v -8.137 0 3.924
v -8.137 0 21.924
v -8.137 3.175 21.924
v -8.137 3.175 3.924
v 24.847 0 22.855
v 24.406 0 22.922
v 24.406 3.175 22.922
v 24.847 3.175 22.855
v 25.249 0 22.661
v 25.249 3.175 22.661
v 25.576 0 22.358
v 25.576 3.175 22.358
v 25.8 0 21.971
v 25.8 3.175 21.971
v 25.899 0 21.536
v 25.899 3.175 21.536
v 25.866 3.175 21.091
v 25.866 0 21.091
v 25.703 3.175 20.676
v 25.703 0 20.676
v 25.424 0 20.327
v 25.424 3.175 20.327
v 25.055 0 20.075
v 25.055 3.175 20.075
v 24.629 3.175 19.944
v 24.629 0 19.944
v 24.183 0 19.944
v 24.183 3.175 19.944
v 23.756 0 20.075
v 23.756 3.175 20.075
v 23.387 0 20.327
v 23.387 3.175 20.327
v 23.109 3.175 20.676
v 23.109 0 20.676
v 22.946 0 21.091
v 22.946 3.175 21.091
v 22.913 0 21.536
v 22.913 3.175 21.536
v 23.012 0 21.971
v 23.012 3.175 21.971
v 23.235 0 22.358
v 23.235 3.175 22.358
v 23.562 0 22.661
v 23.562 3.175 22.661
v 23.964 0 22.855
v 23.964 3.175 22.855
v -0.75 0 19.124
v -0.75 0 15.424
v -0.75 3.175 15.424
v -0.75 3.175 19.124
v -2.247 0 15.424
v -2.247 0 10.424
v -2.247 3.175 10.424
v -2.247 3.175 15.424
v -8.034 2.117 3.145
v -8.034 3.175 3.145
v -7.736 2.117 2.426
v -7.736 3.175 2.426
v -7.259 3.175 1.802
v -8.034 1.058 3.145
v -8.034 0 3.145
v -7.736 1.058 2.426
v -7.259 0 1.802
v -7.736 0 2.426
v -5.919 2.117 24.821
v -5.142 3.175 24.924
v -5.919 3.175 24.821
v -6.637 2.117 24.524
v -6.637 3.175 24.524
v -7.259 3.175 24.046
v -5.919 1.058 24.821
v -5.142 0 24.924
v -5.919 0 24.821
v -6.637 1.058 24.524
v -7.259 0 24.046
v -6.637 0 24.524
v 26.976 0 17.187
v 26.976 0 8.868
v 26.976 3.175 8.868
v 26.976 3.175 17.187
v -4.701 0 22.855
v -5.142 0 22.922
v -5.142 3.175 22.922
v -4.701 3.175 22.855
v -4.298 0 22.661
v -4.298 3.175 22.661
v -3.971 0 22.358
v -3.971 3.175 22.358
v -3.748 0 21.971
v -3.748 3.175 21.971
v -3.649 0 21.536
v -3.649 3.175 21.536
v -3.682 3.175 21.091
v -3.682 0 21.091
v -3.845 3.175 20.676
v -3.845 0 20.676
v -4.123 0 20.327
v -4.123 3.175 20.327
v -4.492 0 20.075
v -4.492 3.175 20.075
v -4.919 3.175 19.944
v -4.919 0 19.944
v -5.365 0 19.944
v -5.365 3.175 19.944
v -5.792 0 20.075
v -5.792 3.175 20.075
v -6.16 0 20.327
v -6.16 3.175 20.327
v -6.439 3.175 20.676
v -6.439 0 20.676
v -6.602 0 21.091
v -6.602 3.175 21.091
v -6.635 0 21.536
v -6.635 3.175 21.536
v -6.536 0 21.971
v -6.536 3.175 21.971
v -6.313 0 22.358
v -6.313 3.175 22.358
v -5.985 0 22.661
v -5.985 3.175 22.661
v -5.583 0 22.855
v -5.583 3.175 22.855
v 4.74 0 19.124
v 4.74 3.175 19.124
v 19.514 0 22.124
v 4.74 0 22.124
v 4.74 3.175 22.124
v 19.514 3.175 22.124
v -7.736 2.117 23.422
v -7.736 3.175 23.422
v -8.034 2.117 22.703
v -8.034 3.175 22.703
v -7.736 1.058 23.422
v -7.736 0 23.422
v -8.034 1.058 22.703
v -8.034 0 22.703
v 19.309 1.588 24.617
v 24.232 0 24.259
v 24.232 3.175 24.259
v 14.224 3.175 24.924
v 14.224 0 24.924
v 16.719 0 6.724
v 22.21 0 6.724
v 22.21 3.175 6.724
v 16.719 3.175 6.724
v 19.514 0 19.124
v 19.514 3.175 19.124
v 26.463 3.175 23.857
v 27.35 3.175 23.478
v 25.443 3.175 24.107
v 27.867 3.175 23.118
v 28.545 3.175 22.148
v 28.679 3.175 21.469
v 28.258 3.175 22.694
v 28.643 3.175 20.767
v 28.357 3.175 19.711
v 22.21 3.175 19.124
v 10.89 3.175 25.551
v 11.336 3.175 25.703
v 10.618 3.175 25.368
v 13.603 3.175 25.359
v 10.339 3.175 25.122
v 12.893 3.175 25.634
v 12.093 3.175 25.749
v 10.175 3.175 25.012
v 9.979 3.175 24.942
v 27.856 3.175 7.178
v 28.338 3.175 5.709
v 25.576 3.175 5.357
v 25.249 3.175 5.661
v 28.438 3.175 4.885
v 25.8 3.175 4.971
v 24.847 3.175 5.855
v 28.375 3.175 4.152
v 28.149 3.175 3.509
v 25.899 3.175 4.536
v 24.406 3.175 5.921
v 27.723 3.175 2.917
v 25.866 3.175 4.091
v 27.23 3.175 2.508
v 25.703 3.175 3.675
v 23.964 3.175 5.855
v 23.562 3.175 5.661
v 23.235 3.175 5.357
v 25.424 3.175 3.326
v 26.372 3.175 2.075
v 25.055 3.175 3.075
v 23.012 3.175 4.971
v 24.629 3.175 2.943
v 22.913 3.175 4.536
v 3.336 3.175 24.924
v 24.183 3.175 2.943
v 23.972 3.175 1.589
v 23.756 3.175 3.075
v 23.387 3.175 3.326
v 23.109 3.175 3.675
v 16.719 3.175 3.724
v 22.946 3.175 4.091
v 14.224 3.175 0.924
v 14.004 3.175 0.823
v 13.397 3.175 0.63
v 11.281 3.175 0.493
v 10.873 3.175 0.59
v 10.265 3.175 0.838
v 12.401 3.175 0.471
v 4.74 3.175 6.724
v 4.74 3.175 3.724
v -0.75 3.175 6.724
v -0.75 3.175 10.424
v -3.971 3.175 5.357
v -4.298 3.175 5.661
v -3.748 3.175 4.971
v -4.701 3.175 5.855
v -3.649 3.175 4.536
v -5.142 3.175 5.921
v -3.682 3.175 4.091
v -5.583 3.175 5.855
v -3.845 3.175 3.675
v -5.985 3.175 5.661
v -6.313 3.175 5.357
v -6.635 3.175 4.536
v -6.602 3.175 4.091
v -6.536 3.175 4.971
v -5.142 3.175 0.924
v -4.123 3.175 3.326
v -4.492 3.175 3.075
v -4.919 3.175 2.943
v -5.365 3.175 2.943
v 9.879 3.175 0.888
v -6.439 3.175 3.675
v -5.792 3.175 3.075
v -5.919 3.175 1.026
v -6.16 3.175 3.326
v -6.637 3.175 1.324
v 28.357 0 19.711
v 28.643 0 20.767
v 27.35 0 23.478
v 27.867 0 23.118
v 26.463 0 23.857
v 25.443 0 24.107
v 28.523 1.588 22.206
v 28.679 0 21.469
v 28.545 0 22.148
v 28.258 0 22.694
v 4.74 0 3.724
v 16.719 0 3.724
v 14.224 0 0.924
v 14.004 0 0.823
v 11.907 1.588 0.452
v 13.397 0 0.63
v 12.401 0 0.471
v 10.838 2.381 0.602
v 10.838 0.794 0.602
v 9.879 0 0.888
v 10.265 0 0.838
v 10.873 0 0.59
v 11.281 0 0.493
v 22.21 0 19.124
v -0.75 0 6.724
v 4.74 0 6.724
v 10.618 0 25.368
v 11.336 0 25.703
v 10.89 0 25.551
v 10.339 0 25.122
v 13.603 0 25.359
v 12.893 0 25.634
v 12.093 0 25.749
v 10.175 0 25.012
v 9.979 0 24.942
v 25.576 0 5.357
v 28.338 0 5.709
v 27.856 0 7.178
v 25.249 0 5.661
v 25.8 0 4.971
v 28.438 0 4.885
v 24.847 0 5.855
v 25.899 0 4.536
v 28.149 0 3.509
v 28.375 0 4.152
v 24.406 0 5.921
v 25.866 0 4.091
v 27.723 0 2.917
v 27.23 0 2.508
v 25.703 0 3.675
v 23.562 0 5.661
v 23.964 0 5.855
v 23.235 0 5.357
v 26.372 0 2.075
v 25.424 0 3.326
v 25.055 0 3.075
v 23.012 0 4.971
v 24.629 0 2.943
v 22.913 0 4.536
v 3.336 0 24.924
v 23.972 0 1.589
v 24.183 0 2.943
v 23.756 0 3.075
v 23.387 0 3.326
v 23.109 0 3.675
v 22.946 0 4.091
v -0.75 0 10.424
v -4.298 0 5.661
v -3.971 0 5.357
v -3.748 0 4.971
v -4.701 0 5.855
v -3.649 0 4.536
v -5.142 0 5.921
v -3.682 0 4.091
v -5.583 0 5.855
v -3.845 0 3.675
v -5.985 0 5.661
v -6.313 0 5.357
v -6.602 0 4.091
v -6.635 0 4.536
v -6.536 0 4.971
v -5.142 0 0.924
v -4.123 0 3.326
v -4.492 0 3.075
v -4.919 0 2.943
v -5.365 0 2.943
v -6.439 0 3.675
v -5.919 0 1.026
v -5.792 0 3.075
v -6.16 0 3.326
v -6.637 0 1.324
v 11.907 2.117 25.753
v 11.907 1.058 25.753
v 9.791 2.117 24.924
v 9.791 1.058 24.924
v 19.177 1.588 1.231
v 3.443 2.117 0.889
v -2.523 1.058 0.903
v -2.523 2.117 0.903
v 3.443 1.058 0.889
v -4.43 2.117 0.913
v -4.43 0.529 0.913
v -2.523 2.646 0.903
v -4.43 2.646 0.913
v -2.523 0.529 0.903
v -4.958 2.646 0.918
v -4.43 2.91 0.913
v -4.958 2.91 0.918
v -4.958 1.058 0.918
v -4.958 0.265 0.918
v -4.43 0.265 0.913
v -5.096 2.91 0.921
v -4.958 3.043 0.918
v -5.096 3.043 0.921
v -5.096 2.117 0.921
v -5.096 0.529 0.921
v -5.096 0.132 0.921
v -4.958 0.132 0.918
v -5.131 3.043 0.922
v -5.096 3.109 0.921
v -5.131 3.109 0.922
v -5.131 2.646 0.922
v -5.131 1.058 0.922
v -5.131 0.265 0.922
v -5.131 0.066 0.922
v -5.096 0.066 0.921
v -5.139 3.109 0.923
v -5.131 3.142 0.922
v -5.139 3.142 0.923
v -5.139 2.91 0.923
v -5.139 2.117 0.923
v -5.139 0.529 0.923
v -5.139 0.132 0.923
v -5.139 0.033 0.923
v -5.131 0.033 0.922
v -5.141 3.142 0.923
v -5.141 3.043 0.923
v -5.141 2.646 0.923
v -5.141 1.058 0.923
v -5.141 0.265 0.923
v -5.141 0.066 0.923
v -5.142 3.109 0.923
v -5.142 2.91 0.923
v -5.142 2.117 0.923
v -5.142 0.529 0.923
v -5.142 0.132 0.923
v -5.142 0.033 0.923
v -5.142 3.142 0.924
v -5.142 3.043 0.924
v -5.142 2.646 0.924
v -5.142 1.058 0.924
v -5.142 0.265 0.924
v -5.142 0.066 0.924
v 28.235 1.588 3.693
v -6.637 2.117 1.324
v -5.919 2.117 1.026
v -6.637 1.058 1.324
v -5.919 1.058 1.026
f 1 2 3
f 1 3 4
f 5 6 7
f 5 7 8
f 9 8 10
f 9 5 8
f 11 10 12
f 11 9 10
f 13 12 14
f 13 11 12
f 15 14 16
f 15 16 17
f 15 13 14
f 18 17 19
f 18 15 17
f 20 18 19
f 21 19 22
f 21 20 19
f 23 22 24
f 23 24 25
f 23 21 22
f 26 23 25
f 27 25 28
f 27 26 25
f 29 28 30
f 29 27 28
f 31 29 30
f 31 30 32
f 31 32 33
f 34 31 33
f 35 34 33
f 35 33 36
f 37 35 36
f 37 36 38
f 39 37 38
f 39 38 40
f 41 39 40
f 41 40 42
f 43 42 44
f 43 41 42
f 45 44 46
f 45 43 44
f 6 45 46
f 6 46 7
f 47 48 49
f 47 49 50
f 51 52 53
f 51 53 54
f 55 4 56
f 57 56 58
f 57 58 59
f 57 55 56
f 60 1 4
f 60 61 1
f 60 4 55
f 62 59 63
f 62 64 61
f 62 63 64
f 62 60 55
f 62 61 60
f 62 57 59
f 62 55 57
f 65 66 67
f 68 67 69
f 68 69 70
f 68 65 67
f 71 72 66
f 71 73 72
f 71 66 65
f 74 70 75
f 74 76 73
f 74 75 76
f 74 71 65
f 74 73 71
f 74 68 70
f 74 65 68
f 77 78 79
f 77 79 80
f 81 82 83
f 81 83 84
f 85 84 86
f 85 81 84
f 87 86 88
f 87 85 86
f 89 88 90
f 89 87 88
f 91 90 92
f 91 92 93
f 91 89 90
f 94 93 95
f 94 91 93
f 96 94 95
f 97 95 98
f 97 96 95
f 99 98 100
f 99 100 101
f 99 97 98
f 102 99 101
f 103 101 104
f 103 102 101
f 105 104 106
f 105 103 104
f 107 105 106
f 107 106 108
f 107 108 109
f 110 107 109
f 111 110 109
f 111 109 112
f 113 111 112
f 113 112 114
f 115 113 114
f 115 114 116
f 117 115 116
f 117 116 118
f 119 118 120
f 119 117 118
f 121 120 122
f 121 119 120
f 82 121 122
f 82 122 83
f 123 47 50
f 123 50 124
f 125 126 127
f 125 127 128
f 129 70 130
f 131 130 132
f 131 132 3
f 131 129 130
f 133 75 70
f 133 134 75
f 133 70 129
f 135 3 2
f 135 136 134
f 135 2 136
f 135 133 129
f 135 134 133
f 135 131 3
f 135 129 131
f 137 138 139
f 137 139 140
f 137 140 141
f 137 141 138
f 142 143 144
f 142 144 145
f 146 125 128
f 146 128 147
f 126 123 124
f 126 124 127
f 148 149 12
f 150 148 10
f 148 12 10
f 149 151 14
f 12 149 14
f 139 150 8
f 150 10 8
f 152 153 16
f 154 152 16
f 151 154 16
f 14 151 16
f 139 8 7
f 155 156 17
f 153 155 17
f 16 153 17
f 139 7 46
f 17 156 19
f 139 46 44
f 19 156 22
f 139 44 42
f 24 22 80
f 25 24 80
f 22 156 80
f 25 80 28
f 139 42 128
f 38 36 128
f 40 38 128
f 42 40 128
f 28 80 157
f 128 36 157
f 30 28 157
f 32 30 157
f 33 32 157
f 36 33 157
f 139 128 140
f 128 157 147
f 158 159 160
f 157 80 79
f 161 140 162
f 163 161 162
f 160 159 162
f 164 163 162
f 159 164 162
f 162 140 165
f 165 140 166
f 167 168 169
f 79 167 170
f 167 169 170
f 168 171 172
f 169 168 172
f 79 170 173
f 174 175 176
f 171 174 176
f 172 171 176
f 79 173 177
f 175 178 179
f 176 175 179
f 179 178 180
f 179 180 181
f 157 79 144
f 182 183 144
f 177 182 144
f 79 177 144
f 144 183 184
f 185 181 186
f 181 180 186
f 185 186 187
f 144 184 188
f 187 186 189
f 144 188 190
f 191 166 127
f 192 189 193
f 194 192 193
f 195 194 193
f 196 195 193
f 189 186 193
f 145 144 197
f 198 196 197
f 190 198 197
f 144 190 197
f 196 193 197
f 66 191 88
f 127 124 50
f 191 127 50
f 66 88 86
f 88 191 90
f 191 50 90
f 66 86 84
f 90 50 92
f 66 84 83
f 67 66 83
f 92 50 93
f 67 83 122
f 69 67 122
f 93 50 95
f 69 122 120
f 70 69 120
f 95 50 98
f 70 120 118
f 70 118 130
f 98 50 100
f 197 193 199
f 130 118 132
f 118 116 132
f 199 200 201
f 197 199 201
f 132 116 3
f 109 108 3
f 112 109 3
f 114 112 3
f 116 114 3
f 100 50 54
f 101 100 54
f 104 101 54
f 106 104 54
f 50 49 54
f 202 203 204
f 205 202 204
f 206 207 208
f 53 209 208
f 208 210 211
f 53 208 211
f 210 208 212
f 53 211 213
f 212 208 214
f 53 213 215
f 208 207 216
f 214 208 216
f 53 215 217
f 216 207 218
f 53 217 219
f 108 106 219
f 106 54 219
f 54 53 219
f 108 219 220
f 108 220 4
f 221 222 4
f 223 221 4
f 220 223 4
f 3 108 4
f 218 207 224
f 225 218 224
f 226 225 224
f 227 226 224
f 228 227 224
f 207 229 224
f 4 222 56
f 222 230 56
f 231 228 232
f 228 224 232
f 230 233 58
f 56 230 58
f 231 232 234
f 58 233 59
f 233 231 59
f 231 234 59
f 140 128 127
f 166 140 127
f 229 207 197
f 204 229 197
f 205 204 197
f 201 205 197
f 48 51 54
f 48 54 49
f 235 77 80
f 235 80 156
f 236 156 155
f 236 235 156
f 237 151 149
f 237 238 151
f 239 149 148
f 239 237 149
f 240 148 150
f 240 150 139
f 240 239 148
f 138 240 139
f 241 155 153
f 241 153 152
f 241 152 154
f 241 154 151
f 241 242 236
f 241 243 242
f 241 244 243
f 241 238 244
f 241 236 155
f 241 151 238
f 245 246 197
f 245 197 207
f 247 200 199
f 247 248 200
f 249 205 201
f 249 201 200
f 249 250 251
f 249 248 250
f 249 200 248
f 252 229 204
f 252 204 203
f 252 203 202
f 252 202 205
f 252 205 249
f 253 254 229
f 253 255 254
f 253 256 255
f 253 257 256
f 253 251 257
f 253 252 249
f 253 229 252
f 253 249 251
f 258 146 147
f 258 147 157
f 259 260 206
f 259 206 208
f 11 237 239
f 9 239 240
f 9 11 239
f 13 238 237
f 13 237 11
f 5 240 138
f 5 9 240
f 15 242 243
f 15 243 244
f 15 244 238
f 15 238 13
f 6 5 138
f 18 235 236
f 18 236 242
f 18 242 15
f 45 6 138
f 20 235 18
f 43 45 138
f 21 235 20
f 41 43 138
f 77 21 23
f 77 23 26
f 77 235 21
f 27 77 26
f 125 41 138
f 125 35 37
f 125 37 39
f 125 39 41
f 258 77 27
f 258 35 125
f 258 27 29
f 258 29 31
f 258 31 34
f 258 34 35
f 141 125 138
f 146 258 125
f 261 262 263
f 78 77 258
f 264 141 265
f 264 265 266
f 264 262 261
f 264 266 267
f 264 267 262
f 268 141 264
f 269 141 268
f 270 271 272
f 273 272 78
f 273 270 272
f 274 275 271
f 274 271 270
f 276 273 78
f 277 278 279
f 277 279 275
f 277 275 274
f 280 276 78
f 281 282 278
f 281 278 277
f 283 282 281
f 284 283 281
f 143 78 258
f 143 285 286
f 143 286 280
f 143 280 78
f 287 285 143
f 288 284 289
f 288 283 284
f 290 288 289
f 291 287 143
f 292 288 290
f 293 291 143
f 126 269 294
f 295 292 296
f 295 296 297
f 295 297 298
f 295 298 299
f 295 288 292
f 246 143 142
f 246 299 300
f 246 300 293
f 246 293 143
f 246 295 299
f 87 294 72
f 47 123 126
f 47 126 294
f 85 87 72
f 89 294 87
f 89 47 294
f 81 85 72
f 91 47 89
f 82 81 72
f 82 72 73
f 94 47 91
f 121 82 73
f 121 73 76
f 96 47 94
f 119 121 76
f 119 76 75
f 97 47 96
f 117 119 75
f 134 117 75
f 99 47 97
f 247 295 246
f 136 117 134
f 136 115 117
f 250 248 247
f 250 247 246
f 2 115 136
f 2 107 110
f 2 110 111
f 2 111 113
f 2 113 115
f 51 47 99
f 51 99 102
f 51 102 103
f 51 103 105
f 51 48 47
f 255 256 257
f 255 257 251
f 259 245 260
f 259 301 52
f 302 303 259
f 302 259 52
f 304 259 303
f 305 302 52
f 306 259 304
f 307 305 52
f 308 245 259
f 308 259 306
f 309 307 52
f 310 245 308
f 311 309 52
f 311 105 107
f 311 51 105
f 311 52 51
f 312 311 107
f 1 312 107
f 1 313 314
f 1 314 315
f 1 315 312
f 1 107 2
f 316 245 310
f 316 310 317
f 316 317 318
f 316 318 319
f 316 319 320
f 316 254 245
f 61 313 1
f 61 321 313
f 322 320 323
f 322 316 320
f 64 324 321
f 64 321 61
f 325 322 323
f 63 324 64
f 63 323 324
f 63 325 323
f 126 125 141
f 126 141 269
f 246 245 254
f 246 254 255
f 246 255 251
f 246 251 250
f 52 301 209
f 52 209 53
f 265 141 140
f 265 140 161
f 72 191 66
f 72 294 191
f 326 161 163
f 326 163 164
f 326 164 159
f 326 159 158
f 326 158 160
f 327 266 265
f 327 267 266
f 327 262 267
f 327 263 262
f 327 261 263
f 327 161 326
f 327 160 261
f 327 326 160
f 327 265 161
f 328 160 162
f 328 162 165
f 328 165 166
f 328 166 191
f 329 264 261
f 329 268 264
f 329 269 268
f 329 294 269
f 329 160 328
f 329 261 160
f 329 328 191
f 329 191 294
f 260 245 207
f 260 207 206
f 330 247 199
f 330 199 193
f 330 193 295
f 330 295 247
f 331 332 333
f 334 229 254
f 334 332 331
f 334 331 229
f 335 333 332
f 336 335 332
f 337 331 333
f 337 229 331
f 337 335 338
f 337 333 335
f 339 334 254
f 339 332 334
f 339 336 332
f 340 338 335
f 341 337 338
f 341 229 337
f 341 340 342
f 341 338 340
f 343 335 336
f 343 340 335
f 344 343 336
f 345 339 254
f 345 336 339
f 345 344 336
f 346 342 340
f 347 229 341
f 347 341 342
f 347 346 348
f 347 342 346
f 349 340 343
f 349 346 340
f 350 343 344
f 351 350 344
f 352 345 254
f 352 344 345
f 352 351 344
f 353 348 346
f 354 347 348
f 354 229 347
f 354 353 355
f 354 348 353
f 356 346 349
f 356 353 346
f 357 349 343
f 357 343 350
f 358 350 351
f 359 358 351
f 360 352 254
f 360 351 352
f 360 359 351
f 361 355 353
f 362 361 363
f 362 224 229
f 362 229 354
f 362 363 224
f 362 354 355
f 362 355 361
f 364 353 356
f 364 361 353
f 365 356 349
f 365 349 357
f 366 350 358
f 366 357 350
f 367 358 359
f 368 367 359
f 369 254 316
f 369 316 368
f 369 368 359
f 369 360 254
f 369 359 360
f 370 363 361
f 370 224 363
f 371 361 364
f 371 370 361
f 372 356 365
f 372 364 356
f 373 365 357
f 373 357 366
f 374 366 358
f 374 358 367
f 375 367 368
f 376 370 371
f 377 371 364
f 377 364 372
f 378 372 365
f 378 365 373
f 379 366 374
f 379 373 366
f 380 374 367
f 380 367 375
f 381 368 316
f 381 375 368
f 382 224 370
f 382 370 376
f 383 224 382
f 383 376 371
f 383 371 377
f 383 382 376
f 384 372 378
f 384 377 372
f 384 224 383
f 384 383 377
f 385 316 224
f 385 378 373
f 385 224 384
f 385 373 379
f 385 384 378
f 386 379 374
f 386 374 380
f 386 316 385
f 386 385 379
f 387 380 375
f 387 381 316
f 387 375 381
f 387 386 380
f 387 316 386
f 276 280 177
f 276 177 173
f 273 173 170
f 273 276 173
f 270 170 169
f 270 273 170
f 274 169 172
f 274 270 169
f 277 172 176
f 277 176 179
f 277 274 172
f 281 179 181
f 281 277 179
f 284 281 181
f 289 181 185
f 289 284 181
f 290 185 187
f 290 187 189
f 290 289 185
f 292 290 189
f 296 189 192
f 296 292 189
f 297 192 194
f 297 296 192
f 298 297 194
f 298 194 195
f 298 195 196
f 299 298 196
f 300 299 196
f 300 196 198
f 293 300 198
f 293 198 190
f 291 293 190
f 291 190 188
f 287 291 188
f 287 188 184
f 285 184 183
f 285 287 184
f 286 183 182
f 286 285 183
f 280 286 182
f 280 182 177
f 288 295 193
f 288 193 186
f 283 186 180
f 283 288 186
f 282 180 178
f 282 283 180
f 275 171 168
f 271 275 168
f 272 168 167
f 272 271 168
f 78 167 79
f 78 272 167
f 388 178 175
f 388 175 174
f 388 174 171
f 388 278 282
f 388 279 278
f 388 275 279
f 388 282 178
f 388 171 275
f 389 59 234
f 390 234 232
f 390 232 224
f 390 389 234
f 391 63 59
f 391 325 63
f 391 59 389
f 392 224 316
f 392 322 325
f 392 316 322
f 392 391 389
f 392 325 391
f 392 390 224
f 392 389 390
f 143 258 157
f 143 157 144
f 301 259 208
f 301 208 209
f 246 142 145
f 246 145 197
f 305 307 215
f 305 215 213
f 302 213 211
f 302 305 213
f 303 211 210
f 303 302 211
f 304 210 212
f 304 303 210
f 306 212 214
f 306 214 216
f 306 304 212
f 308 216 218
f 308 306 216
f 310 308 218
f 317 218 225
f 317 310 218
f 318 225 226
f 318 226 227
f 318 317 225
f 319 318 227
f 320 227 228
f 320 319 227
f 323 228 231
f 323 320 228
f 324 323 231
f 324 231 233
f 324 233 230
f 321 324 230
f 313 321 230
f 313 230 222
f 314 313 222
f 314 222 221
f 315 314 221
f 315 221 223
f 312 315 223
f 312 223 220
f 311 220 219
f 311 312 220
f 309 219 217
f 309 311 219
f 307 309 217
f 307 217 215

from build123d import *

# Parameters (mm, degrees)
SKETCH1_R           = 1.497356825
SKETCH1_R_2         = 1.497356824
BOSS_EXTRUDE1_DEPTH = 3.175


with BuildPart() as part:
    # Sketch1 → Boss-Extrude1 (new body)
    with BuildSketch(Plane(origin=(0, 0, 0), x_dir=(1, 0, 0), z_dir=(0, 1, 0))):
        with BuildLine():
            Line((-8.136635094, -21.924266481), (-8.136635094, -3.923663686))
            add(Edge.make_bspline(
                [(-8.136635094, -3.923663686), (-8.136635094, -3.128086205), (-7.820964416, -2.365025621), (-7.259379446, -1.802237676)],
                knots=[1, 1, 1, 1, 2, 2, 2, 2], degree=3))
            add(Edge.make_bspline(
                [(-7.259379446, -1.802237676), (-6.697735984, -1.239635291), (-5.936245423, -0.92358316), (-5.141916572, -0.92358316)],
                knots=[2, 2, 2, 2, 3, 3, 3, 3], degree=3))
            add(Edge.make_bspline(
                [(-5.141916572, -0.92358316), (-5.154760404, -0.903039747), (4.165830441, -0.878716777), (9.879205527, -0.887994762)],
                knots=[3, 3, 3, 3, 4, 4, 4, 4], degree=3))
            add(Edge.make_bspline(
                [(9.879205527, -0.887994762), (10.624976408, -0.889274148), (10.564154649, -0.451680408), (11.906649469, -0.451680408)],
                knots=[4, 4, 4, 4, 5, 5, 5, 5], degree=3))
            add(Edge.make_bspline(
                [(11.906649469, -0.451680408), (13.315966334, -0.451680408), (14.214756726, -0.909055789), (14.223632862, -0.923583161)],
                knots=[5, 5, 5, 5, 6, 6, 6, 6], degree=3))
            add(Edge.make_bspline(
                [(14.223632862, -0.923583161), (19.256657746, -1.206420105), (23.971643033, -1.588653571)],
                knots=[6, 6, 6, 7, 7, 7], degree=2))
            add(Edge.make_bspline(
                [(23.971643033, -1.588653571), (30.995498409, -2.158356056), (26.975559396, -8.867814209)],
                knots=[7, 7, 7, 8, 8, 8], degree=2))
            Line((26.975559396, -8.867814209), (26.975559396, -17.1873007))
            add(Edge.make_bspline(
                [(26.975559396, -17.1873007), (31.442656292, -23.689574114), (24.231731846, -24.259083715)],
                knots=[9, 9, 9, 10, 10, 10], degree=2))
            add(Edge.make_bspline(
                [(24.231731846, -24.259083715), (19.39082339, -24.641510065), (14.223632861, -24.924217604)],
                knots=[10, 10, 10, 11, 11, 11], degree=2))
            add(Edge.make_bspline(
                [(14.223632861, -24.924217604), (13.297697384, -25.752946792), (11.906649468, -25.752946792)],
                knots=[11, 11, 11, 12, 12, 12], degree=2))
            add(Edge.make_bspline(
                [(11.906649468, -25.752946792), (10.398617885, -25.752946792), (10.590032411, -24.924217604), (9.791165568, -24.924217604)],
                knots=[12, 12, 12, 12, 13, 13, 13, 13], degree=3))
            add(Edge.make_bspline(
                [(9.791165568, -24.924217604), (4.074534437, -24.924217604), (-5.141916573, -24.924217603)],
                knots=[13, 13, 13, 14, 14, 14], degree=2))
            add(Edge.make_bspline(
                [(-5.141916573, -24.924217603), (-5.936245424, -24.924217603), (-6.697735984, -24.608292434), (-7.259379446, -24.045694932)],
                knots=[14, 14, 14, 14, 15, 15, 15, 15], degree=3))
            add(Edge.make_bspline(
                [(-7.259379446, -24.045694932), (-7.820964416, -23.483094989), (-8.136635094, -22.71984152), (-8.136635094, -21.924266481)],
                knots=[15, 15, 15, 15, 16, 16, 16, 16], degree=3))
        make_face()
        with Locations(Location((-5.141916573, -4.423727567, 0), (0, 0, 270))):
            Circle(SKETCH1_R, mode=Mode.SUBTRACT)
        with Locations(Location((24.40576455, -4.423727568, 0), (0, 0, 270))):
            Circle(SKETCH1_R_2, mode=Mode.SUBTRACT)
        with Locations(Location((-5.141916573, -21.42420016, 0), (0, 0, 270))):
            Circle(SKETCH1_R_2, mode=Mode.SUBTRACT)
        with Locations(Location((24.40576455, -21.42420016, 0), (0, 0, 270))):
            Circle(SKETCH1_R_2, mode=Mode.SUBTRACT)
        Polygon((-2.246994867, -15.424170952), (-0.749638043, -15.424170952), (-0.749638043, -19.12426571), (4.740444467, -19.12426571), (4.740444467, -22.124153352), (19.514384952, -22.124153352), (19.514384952, -19.12426571), (22.209527799, -19.12426571), (22.209527799, -6.723857342), (16.719255189, -6.723857342), (16.719255189, -3.723713335), (4.740444467, -3.723713335), (4.740444467, -6.723857342), (-0.749638043, -6.723857342), (-0.749638043, -10.4239521), (-2.246994867, -10.4239521), align=None, mode=Mode.SUBTRACT)
    extrude(amount=BOSS_EXTRUDE1_DEPTH)


solid = part.part
